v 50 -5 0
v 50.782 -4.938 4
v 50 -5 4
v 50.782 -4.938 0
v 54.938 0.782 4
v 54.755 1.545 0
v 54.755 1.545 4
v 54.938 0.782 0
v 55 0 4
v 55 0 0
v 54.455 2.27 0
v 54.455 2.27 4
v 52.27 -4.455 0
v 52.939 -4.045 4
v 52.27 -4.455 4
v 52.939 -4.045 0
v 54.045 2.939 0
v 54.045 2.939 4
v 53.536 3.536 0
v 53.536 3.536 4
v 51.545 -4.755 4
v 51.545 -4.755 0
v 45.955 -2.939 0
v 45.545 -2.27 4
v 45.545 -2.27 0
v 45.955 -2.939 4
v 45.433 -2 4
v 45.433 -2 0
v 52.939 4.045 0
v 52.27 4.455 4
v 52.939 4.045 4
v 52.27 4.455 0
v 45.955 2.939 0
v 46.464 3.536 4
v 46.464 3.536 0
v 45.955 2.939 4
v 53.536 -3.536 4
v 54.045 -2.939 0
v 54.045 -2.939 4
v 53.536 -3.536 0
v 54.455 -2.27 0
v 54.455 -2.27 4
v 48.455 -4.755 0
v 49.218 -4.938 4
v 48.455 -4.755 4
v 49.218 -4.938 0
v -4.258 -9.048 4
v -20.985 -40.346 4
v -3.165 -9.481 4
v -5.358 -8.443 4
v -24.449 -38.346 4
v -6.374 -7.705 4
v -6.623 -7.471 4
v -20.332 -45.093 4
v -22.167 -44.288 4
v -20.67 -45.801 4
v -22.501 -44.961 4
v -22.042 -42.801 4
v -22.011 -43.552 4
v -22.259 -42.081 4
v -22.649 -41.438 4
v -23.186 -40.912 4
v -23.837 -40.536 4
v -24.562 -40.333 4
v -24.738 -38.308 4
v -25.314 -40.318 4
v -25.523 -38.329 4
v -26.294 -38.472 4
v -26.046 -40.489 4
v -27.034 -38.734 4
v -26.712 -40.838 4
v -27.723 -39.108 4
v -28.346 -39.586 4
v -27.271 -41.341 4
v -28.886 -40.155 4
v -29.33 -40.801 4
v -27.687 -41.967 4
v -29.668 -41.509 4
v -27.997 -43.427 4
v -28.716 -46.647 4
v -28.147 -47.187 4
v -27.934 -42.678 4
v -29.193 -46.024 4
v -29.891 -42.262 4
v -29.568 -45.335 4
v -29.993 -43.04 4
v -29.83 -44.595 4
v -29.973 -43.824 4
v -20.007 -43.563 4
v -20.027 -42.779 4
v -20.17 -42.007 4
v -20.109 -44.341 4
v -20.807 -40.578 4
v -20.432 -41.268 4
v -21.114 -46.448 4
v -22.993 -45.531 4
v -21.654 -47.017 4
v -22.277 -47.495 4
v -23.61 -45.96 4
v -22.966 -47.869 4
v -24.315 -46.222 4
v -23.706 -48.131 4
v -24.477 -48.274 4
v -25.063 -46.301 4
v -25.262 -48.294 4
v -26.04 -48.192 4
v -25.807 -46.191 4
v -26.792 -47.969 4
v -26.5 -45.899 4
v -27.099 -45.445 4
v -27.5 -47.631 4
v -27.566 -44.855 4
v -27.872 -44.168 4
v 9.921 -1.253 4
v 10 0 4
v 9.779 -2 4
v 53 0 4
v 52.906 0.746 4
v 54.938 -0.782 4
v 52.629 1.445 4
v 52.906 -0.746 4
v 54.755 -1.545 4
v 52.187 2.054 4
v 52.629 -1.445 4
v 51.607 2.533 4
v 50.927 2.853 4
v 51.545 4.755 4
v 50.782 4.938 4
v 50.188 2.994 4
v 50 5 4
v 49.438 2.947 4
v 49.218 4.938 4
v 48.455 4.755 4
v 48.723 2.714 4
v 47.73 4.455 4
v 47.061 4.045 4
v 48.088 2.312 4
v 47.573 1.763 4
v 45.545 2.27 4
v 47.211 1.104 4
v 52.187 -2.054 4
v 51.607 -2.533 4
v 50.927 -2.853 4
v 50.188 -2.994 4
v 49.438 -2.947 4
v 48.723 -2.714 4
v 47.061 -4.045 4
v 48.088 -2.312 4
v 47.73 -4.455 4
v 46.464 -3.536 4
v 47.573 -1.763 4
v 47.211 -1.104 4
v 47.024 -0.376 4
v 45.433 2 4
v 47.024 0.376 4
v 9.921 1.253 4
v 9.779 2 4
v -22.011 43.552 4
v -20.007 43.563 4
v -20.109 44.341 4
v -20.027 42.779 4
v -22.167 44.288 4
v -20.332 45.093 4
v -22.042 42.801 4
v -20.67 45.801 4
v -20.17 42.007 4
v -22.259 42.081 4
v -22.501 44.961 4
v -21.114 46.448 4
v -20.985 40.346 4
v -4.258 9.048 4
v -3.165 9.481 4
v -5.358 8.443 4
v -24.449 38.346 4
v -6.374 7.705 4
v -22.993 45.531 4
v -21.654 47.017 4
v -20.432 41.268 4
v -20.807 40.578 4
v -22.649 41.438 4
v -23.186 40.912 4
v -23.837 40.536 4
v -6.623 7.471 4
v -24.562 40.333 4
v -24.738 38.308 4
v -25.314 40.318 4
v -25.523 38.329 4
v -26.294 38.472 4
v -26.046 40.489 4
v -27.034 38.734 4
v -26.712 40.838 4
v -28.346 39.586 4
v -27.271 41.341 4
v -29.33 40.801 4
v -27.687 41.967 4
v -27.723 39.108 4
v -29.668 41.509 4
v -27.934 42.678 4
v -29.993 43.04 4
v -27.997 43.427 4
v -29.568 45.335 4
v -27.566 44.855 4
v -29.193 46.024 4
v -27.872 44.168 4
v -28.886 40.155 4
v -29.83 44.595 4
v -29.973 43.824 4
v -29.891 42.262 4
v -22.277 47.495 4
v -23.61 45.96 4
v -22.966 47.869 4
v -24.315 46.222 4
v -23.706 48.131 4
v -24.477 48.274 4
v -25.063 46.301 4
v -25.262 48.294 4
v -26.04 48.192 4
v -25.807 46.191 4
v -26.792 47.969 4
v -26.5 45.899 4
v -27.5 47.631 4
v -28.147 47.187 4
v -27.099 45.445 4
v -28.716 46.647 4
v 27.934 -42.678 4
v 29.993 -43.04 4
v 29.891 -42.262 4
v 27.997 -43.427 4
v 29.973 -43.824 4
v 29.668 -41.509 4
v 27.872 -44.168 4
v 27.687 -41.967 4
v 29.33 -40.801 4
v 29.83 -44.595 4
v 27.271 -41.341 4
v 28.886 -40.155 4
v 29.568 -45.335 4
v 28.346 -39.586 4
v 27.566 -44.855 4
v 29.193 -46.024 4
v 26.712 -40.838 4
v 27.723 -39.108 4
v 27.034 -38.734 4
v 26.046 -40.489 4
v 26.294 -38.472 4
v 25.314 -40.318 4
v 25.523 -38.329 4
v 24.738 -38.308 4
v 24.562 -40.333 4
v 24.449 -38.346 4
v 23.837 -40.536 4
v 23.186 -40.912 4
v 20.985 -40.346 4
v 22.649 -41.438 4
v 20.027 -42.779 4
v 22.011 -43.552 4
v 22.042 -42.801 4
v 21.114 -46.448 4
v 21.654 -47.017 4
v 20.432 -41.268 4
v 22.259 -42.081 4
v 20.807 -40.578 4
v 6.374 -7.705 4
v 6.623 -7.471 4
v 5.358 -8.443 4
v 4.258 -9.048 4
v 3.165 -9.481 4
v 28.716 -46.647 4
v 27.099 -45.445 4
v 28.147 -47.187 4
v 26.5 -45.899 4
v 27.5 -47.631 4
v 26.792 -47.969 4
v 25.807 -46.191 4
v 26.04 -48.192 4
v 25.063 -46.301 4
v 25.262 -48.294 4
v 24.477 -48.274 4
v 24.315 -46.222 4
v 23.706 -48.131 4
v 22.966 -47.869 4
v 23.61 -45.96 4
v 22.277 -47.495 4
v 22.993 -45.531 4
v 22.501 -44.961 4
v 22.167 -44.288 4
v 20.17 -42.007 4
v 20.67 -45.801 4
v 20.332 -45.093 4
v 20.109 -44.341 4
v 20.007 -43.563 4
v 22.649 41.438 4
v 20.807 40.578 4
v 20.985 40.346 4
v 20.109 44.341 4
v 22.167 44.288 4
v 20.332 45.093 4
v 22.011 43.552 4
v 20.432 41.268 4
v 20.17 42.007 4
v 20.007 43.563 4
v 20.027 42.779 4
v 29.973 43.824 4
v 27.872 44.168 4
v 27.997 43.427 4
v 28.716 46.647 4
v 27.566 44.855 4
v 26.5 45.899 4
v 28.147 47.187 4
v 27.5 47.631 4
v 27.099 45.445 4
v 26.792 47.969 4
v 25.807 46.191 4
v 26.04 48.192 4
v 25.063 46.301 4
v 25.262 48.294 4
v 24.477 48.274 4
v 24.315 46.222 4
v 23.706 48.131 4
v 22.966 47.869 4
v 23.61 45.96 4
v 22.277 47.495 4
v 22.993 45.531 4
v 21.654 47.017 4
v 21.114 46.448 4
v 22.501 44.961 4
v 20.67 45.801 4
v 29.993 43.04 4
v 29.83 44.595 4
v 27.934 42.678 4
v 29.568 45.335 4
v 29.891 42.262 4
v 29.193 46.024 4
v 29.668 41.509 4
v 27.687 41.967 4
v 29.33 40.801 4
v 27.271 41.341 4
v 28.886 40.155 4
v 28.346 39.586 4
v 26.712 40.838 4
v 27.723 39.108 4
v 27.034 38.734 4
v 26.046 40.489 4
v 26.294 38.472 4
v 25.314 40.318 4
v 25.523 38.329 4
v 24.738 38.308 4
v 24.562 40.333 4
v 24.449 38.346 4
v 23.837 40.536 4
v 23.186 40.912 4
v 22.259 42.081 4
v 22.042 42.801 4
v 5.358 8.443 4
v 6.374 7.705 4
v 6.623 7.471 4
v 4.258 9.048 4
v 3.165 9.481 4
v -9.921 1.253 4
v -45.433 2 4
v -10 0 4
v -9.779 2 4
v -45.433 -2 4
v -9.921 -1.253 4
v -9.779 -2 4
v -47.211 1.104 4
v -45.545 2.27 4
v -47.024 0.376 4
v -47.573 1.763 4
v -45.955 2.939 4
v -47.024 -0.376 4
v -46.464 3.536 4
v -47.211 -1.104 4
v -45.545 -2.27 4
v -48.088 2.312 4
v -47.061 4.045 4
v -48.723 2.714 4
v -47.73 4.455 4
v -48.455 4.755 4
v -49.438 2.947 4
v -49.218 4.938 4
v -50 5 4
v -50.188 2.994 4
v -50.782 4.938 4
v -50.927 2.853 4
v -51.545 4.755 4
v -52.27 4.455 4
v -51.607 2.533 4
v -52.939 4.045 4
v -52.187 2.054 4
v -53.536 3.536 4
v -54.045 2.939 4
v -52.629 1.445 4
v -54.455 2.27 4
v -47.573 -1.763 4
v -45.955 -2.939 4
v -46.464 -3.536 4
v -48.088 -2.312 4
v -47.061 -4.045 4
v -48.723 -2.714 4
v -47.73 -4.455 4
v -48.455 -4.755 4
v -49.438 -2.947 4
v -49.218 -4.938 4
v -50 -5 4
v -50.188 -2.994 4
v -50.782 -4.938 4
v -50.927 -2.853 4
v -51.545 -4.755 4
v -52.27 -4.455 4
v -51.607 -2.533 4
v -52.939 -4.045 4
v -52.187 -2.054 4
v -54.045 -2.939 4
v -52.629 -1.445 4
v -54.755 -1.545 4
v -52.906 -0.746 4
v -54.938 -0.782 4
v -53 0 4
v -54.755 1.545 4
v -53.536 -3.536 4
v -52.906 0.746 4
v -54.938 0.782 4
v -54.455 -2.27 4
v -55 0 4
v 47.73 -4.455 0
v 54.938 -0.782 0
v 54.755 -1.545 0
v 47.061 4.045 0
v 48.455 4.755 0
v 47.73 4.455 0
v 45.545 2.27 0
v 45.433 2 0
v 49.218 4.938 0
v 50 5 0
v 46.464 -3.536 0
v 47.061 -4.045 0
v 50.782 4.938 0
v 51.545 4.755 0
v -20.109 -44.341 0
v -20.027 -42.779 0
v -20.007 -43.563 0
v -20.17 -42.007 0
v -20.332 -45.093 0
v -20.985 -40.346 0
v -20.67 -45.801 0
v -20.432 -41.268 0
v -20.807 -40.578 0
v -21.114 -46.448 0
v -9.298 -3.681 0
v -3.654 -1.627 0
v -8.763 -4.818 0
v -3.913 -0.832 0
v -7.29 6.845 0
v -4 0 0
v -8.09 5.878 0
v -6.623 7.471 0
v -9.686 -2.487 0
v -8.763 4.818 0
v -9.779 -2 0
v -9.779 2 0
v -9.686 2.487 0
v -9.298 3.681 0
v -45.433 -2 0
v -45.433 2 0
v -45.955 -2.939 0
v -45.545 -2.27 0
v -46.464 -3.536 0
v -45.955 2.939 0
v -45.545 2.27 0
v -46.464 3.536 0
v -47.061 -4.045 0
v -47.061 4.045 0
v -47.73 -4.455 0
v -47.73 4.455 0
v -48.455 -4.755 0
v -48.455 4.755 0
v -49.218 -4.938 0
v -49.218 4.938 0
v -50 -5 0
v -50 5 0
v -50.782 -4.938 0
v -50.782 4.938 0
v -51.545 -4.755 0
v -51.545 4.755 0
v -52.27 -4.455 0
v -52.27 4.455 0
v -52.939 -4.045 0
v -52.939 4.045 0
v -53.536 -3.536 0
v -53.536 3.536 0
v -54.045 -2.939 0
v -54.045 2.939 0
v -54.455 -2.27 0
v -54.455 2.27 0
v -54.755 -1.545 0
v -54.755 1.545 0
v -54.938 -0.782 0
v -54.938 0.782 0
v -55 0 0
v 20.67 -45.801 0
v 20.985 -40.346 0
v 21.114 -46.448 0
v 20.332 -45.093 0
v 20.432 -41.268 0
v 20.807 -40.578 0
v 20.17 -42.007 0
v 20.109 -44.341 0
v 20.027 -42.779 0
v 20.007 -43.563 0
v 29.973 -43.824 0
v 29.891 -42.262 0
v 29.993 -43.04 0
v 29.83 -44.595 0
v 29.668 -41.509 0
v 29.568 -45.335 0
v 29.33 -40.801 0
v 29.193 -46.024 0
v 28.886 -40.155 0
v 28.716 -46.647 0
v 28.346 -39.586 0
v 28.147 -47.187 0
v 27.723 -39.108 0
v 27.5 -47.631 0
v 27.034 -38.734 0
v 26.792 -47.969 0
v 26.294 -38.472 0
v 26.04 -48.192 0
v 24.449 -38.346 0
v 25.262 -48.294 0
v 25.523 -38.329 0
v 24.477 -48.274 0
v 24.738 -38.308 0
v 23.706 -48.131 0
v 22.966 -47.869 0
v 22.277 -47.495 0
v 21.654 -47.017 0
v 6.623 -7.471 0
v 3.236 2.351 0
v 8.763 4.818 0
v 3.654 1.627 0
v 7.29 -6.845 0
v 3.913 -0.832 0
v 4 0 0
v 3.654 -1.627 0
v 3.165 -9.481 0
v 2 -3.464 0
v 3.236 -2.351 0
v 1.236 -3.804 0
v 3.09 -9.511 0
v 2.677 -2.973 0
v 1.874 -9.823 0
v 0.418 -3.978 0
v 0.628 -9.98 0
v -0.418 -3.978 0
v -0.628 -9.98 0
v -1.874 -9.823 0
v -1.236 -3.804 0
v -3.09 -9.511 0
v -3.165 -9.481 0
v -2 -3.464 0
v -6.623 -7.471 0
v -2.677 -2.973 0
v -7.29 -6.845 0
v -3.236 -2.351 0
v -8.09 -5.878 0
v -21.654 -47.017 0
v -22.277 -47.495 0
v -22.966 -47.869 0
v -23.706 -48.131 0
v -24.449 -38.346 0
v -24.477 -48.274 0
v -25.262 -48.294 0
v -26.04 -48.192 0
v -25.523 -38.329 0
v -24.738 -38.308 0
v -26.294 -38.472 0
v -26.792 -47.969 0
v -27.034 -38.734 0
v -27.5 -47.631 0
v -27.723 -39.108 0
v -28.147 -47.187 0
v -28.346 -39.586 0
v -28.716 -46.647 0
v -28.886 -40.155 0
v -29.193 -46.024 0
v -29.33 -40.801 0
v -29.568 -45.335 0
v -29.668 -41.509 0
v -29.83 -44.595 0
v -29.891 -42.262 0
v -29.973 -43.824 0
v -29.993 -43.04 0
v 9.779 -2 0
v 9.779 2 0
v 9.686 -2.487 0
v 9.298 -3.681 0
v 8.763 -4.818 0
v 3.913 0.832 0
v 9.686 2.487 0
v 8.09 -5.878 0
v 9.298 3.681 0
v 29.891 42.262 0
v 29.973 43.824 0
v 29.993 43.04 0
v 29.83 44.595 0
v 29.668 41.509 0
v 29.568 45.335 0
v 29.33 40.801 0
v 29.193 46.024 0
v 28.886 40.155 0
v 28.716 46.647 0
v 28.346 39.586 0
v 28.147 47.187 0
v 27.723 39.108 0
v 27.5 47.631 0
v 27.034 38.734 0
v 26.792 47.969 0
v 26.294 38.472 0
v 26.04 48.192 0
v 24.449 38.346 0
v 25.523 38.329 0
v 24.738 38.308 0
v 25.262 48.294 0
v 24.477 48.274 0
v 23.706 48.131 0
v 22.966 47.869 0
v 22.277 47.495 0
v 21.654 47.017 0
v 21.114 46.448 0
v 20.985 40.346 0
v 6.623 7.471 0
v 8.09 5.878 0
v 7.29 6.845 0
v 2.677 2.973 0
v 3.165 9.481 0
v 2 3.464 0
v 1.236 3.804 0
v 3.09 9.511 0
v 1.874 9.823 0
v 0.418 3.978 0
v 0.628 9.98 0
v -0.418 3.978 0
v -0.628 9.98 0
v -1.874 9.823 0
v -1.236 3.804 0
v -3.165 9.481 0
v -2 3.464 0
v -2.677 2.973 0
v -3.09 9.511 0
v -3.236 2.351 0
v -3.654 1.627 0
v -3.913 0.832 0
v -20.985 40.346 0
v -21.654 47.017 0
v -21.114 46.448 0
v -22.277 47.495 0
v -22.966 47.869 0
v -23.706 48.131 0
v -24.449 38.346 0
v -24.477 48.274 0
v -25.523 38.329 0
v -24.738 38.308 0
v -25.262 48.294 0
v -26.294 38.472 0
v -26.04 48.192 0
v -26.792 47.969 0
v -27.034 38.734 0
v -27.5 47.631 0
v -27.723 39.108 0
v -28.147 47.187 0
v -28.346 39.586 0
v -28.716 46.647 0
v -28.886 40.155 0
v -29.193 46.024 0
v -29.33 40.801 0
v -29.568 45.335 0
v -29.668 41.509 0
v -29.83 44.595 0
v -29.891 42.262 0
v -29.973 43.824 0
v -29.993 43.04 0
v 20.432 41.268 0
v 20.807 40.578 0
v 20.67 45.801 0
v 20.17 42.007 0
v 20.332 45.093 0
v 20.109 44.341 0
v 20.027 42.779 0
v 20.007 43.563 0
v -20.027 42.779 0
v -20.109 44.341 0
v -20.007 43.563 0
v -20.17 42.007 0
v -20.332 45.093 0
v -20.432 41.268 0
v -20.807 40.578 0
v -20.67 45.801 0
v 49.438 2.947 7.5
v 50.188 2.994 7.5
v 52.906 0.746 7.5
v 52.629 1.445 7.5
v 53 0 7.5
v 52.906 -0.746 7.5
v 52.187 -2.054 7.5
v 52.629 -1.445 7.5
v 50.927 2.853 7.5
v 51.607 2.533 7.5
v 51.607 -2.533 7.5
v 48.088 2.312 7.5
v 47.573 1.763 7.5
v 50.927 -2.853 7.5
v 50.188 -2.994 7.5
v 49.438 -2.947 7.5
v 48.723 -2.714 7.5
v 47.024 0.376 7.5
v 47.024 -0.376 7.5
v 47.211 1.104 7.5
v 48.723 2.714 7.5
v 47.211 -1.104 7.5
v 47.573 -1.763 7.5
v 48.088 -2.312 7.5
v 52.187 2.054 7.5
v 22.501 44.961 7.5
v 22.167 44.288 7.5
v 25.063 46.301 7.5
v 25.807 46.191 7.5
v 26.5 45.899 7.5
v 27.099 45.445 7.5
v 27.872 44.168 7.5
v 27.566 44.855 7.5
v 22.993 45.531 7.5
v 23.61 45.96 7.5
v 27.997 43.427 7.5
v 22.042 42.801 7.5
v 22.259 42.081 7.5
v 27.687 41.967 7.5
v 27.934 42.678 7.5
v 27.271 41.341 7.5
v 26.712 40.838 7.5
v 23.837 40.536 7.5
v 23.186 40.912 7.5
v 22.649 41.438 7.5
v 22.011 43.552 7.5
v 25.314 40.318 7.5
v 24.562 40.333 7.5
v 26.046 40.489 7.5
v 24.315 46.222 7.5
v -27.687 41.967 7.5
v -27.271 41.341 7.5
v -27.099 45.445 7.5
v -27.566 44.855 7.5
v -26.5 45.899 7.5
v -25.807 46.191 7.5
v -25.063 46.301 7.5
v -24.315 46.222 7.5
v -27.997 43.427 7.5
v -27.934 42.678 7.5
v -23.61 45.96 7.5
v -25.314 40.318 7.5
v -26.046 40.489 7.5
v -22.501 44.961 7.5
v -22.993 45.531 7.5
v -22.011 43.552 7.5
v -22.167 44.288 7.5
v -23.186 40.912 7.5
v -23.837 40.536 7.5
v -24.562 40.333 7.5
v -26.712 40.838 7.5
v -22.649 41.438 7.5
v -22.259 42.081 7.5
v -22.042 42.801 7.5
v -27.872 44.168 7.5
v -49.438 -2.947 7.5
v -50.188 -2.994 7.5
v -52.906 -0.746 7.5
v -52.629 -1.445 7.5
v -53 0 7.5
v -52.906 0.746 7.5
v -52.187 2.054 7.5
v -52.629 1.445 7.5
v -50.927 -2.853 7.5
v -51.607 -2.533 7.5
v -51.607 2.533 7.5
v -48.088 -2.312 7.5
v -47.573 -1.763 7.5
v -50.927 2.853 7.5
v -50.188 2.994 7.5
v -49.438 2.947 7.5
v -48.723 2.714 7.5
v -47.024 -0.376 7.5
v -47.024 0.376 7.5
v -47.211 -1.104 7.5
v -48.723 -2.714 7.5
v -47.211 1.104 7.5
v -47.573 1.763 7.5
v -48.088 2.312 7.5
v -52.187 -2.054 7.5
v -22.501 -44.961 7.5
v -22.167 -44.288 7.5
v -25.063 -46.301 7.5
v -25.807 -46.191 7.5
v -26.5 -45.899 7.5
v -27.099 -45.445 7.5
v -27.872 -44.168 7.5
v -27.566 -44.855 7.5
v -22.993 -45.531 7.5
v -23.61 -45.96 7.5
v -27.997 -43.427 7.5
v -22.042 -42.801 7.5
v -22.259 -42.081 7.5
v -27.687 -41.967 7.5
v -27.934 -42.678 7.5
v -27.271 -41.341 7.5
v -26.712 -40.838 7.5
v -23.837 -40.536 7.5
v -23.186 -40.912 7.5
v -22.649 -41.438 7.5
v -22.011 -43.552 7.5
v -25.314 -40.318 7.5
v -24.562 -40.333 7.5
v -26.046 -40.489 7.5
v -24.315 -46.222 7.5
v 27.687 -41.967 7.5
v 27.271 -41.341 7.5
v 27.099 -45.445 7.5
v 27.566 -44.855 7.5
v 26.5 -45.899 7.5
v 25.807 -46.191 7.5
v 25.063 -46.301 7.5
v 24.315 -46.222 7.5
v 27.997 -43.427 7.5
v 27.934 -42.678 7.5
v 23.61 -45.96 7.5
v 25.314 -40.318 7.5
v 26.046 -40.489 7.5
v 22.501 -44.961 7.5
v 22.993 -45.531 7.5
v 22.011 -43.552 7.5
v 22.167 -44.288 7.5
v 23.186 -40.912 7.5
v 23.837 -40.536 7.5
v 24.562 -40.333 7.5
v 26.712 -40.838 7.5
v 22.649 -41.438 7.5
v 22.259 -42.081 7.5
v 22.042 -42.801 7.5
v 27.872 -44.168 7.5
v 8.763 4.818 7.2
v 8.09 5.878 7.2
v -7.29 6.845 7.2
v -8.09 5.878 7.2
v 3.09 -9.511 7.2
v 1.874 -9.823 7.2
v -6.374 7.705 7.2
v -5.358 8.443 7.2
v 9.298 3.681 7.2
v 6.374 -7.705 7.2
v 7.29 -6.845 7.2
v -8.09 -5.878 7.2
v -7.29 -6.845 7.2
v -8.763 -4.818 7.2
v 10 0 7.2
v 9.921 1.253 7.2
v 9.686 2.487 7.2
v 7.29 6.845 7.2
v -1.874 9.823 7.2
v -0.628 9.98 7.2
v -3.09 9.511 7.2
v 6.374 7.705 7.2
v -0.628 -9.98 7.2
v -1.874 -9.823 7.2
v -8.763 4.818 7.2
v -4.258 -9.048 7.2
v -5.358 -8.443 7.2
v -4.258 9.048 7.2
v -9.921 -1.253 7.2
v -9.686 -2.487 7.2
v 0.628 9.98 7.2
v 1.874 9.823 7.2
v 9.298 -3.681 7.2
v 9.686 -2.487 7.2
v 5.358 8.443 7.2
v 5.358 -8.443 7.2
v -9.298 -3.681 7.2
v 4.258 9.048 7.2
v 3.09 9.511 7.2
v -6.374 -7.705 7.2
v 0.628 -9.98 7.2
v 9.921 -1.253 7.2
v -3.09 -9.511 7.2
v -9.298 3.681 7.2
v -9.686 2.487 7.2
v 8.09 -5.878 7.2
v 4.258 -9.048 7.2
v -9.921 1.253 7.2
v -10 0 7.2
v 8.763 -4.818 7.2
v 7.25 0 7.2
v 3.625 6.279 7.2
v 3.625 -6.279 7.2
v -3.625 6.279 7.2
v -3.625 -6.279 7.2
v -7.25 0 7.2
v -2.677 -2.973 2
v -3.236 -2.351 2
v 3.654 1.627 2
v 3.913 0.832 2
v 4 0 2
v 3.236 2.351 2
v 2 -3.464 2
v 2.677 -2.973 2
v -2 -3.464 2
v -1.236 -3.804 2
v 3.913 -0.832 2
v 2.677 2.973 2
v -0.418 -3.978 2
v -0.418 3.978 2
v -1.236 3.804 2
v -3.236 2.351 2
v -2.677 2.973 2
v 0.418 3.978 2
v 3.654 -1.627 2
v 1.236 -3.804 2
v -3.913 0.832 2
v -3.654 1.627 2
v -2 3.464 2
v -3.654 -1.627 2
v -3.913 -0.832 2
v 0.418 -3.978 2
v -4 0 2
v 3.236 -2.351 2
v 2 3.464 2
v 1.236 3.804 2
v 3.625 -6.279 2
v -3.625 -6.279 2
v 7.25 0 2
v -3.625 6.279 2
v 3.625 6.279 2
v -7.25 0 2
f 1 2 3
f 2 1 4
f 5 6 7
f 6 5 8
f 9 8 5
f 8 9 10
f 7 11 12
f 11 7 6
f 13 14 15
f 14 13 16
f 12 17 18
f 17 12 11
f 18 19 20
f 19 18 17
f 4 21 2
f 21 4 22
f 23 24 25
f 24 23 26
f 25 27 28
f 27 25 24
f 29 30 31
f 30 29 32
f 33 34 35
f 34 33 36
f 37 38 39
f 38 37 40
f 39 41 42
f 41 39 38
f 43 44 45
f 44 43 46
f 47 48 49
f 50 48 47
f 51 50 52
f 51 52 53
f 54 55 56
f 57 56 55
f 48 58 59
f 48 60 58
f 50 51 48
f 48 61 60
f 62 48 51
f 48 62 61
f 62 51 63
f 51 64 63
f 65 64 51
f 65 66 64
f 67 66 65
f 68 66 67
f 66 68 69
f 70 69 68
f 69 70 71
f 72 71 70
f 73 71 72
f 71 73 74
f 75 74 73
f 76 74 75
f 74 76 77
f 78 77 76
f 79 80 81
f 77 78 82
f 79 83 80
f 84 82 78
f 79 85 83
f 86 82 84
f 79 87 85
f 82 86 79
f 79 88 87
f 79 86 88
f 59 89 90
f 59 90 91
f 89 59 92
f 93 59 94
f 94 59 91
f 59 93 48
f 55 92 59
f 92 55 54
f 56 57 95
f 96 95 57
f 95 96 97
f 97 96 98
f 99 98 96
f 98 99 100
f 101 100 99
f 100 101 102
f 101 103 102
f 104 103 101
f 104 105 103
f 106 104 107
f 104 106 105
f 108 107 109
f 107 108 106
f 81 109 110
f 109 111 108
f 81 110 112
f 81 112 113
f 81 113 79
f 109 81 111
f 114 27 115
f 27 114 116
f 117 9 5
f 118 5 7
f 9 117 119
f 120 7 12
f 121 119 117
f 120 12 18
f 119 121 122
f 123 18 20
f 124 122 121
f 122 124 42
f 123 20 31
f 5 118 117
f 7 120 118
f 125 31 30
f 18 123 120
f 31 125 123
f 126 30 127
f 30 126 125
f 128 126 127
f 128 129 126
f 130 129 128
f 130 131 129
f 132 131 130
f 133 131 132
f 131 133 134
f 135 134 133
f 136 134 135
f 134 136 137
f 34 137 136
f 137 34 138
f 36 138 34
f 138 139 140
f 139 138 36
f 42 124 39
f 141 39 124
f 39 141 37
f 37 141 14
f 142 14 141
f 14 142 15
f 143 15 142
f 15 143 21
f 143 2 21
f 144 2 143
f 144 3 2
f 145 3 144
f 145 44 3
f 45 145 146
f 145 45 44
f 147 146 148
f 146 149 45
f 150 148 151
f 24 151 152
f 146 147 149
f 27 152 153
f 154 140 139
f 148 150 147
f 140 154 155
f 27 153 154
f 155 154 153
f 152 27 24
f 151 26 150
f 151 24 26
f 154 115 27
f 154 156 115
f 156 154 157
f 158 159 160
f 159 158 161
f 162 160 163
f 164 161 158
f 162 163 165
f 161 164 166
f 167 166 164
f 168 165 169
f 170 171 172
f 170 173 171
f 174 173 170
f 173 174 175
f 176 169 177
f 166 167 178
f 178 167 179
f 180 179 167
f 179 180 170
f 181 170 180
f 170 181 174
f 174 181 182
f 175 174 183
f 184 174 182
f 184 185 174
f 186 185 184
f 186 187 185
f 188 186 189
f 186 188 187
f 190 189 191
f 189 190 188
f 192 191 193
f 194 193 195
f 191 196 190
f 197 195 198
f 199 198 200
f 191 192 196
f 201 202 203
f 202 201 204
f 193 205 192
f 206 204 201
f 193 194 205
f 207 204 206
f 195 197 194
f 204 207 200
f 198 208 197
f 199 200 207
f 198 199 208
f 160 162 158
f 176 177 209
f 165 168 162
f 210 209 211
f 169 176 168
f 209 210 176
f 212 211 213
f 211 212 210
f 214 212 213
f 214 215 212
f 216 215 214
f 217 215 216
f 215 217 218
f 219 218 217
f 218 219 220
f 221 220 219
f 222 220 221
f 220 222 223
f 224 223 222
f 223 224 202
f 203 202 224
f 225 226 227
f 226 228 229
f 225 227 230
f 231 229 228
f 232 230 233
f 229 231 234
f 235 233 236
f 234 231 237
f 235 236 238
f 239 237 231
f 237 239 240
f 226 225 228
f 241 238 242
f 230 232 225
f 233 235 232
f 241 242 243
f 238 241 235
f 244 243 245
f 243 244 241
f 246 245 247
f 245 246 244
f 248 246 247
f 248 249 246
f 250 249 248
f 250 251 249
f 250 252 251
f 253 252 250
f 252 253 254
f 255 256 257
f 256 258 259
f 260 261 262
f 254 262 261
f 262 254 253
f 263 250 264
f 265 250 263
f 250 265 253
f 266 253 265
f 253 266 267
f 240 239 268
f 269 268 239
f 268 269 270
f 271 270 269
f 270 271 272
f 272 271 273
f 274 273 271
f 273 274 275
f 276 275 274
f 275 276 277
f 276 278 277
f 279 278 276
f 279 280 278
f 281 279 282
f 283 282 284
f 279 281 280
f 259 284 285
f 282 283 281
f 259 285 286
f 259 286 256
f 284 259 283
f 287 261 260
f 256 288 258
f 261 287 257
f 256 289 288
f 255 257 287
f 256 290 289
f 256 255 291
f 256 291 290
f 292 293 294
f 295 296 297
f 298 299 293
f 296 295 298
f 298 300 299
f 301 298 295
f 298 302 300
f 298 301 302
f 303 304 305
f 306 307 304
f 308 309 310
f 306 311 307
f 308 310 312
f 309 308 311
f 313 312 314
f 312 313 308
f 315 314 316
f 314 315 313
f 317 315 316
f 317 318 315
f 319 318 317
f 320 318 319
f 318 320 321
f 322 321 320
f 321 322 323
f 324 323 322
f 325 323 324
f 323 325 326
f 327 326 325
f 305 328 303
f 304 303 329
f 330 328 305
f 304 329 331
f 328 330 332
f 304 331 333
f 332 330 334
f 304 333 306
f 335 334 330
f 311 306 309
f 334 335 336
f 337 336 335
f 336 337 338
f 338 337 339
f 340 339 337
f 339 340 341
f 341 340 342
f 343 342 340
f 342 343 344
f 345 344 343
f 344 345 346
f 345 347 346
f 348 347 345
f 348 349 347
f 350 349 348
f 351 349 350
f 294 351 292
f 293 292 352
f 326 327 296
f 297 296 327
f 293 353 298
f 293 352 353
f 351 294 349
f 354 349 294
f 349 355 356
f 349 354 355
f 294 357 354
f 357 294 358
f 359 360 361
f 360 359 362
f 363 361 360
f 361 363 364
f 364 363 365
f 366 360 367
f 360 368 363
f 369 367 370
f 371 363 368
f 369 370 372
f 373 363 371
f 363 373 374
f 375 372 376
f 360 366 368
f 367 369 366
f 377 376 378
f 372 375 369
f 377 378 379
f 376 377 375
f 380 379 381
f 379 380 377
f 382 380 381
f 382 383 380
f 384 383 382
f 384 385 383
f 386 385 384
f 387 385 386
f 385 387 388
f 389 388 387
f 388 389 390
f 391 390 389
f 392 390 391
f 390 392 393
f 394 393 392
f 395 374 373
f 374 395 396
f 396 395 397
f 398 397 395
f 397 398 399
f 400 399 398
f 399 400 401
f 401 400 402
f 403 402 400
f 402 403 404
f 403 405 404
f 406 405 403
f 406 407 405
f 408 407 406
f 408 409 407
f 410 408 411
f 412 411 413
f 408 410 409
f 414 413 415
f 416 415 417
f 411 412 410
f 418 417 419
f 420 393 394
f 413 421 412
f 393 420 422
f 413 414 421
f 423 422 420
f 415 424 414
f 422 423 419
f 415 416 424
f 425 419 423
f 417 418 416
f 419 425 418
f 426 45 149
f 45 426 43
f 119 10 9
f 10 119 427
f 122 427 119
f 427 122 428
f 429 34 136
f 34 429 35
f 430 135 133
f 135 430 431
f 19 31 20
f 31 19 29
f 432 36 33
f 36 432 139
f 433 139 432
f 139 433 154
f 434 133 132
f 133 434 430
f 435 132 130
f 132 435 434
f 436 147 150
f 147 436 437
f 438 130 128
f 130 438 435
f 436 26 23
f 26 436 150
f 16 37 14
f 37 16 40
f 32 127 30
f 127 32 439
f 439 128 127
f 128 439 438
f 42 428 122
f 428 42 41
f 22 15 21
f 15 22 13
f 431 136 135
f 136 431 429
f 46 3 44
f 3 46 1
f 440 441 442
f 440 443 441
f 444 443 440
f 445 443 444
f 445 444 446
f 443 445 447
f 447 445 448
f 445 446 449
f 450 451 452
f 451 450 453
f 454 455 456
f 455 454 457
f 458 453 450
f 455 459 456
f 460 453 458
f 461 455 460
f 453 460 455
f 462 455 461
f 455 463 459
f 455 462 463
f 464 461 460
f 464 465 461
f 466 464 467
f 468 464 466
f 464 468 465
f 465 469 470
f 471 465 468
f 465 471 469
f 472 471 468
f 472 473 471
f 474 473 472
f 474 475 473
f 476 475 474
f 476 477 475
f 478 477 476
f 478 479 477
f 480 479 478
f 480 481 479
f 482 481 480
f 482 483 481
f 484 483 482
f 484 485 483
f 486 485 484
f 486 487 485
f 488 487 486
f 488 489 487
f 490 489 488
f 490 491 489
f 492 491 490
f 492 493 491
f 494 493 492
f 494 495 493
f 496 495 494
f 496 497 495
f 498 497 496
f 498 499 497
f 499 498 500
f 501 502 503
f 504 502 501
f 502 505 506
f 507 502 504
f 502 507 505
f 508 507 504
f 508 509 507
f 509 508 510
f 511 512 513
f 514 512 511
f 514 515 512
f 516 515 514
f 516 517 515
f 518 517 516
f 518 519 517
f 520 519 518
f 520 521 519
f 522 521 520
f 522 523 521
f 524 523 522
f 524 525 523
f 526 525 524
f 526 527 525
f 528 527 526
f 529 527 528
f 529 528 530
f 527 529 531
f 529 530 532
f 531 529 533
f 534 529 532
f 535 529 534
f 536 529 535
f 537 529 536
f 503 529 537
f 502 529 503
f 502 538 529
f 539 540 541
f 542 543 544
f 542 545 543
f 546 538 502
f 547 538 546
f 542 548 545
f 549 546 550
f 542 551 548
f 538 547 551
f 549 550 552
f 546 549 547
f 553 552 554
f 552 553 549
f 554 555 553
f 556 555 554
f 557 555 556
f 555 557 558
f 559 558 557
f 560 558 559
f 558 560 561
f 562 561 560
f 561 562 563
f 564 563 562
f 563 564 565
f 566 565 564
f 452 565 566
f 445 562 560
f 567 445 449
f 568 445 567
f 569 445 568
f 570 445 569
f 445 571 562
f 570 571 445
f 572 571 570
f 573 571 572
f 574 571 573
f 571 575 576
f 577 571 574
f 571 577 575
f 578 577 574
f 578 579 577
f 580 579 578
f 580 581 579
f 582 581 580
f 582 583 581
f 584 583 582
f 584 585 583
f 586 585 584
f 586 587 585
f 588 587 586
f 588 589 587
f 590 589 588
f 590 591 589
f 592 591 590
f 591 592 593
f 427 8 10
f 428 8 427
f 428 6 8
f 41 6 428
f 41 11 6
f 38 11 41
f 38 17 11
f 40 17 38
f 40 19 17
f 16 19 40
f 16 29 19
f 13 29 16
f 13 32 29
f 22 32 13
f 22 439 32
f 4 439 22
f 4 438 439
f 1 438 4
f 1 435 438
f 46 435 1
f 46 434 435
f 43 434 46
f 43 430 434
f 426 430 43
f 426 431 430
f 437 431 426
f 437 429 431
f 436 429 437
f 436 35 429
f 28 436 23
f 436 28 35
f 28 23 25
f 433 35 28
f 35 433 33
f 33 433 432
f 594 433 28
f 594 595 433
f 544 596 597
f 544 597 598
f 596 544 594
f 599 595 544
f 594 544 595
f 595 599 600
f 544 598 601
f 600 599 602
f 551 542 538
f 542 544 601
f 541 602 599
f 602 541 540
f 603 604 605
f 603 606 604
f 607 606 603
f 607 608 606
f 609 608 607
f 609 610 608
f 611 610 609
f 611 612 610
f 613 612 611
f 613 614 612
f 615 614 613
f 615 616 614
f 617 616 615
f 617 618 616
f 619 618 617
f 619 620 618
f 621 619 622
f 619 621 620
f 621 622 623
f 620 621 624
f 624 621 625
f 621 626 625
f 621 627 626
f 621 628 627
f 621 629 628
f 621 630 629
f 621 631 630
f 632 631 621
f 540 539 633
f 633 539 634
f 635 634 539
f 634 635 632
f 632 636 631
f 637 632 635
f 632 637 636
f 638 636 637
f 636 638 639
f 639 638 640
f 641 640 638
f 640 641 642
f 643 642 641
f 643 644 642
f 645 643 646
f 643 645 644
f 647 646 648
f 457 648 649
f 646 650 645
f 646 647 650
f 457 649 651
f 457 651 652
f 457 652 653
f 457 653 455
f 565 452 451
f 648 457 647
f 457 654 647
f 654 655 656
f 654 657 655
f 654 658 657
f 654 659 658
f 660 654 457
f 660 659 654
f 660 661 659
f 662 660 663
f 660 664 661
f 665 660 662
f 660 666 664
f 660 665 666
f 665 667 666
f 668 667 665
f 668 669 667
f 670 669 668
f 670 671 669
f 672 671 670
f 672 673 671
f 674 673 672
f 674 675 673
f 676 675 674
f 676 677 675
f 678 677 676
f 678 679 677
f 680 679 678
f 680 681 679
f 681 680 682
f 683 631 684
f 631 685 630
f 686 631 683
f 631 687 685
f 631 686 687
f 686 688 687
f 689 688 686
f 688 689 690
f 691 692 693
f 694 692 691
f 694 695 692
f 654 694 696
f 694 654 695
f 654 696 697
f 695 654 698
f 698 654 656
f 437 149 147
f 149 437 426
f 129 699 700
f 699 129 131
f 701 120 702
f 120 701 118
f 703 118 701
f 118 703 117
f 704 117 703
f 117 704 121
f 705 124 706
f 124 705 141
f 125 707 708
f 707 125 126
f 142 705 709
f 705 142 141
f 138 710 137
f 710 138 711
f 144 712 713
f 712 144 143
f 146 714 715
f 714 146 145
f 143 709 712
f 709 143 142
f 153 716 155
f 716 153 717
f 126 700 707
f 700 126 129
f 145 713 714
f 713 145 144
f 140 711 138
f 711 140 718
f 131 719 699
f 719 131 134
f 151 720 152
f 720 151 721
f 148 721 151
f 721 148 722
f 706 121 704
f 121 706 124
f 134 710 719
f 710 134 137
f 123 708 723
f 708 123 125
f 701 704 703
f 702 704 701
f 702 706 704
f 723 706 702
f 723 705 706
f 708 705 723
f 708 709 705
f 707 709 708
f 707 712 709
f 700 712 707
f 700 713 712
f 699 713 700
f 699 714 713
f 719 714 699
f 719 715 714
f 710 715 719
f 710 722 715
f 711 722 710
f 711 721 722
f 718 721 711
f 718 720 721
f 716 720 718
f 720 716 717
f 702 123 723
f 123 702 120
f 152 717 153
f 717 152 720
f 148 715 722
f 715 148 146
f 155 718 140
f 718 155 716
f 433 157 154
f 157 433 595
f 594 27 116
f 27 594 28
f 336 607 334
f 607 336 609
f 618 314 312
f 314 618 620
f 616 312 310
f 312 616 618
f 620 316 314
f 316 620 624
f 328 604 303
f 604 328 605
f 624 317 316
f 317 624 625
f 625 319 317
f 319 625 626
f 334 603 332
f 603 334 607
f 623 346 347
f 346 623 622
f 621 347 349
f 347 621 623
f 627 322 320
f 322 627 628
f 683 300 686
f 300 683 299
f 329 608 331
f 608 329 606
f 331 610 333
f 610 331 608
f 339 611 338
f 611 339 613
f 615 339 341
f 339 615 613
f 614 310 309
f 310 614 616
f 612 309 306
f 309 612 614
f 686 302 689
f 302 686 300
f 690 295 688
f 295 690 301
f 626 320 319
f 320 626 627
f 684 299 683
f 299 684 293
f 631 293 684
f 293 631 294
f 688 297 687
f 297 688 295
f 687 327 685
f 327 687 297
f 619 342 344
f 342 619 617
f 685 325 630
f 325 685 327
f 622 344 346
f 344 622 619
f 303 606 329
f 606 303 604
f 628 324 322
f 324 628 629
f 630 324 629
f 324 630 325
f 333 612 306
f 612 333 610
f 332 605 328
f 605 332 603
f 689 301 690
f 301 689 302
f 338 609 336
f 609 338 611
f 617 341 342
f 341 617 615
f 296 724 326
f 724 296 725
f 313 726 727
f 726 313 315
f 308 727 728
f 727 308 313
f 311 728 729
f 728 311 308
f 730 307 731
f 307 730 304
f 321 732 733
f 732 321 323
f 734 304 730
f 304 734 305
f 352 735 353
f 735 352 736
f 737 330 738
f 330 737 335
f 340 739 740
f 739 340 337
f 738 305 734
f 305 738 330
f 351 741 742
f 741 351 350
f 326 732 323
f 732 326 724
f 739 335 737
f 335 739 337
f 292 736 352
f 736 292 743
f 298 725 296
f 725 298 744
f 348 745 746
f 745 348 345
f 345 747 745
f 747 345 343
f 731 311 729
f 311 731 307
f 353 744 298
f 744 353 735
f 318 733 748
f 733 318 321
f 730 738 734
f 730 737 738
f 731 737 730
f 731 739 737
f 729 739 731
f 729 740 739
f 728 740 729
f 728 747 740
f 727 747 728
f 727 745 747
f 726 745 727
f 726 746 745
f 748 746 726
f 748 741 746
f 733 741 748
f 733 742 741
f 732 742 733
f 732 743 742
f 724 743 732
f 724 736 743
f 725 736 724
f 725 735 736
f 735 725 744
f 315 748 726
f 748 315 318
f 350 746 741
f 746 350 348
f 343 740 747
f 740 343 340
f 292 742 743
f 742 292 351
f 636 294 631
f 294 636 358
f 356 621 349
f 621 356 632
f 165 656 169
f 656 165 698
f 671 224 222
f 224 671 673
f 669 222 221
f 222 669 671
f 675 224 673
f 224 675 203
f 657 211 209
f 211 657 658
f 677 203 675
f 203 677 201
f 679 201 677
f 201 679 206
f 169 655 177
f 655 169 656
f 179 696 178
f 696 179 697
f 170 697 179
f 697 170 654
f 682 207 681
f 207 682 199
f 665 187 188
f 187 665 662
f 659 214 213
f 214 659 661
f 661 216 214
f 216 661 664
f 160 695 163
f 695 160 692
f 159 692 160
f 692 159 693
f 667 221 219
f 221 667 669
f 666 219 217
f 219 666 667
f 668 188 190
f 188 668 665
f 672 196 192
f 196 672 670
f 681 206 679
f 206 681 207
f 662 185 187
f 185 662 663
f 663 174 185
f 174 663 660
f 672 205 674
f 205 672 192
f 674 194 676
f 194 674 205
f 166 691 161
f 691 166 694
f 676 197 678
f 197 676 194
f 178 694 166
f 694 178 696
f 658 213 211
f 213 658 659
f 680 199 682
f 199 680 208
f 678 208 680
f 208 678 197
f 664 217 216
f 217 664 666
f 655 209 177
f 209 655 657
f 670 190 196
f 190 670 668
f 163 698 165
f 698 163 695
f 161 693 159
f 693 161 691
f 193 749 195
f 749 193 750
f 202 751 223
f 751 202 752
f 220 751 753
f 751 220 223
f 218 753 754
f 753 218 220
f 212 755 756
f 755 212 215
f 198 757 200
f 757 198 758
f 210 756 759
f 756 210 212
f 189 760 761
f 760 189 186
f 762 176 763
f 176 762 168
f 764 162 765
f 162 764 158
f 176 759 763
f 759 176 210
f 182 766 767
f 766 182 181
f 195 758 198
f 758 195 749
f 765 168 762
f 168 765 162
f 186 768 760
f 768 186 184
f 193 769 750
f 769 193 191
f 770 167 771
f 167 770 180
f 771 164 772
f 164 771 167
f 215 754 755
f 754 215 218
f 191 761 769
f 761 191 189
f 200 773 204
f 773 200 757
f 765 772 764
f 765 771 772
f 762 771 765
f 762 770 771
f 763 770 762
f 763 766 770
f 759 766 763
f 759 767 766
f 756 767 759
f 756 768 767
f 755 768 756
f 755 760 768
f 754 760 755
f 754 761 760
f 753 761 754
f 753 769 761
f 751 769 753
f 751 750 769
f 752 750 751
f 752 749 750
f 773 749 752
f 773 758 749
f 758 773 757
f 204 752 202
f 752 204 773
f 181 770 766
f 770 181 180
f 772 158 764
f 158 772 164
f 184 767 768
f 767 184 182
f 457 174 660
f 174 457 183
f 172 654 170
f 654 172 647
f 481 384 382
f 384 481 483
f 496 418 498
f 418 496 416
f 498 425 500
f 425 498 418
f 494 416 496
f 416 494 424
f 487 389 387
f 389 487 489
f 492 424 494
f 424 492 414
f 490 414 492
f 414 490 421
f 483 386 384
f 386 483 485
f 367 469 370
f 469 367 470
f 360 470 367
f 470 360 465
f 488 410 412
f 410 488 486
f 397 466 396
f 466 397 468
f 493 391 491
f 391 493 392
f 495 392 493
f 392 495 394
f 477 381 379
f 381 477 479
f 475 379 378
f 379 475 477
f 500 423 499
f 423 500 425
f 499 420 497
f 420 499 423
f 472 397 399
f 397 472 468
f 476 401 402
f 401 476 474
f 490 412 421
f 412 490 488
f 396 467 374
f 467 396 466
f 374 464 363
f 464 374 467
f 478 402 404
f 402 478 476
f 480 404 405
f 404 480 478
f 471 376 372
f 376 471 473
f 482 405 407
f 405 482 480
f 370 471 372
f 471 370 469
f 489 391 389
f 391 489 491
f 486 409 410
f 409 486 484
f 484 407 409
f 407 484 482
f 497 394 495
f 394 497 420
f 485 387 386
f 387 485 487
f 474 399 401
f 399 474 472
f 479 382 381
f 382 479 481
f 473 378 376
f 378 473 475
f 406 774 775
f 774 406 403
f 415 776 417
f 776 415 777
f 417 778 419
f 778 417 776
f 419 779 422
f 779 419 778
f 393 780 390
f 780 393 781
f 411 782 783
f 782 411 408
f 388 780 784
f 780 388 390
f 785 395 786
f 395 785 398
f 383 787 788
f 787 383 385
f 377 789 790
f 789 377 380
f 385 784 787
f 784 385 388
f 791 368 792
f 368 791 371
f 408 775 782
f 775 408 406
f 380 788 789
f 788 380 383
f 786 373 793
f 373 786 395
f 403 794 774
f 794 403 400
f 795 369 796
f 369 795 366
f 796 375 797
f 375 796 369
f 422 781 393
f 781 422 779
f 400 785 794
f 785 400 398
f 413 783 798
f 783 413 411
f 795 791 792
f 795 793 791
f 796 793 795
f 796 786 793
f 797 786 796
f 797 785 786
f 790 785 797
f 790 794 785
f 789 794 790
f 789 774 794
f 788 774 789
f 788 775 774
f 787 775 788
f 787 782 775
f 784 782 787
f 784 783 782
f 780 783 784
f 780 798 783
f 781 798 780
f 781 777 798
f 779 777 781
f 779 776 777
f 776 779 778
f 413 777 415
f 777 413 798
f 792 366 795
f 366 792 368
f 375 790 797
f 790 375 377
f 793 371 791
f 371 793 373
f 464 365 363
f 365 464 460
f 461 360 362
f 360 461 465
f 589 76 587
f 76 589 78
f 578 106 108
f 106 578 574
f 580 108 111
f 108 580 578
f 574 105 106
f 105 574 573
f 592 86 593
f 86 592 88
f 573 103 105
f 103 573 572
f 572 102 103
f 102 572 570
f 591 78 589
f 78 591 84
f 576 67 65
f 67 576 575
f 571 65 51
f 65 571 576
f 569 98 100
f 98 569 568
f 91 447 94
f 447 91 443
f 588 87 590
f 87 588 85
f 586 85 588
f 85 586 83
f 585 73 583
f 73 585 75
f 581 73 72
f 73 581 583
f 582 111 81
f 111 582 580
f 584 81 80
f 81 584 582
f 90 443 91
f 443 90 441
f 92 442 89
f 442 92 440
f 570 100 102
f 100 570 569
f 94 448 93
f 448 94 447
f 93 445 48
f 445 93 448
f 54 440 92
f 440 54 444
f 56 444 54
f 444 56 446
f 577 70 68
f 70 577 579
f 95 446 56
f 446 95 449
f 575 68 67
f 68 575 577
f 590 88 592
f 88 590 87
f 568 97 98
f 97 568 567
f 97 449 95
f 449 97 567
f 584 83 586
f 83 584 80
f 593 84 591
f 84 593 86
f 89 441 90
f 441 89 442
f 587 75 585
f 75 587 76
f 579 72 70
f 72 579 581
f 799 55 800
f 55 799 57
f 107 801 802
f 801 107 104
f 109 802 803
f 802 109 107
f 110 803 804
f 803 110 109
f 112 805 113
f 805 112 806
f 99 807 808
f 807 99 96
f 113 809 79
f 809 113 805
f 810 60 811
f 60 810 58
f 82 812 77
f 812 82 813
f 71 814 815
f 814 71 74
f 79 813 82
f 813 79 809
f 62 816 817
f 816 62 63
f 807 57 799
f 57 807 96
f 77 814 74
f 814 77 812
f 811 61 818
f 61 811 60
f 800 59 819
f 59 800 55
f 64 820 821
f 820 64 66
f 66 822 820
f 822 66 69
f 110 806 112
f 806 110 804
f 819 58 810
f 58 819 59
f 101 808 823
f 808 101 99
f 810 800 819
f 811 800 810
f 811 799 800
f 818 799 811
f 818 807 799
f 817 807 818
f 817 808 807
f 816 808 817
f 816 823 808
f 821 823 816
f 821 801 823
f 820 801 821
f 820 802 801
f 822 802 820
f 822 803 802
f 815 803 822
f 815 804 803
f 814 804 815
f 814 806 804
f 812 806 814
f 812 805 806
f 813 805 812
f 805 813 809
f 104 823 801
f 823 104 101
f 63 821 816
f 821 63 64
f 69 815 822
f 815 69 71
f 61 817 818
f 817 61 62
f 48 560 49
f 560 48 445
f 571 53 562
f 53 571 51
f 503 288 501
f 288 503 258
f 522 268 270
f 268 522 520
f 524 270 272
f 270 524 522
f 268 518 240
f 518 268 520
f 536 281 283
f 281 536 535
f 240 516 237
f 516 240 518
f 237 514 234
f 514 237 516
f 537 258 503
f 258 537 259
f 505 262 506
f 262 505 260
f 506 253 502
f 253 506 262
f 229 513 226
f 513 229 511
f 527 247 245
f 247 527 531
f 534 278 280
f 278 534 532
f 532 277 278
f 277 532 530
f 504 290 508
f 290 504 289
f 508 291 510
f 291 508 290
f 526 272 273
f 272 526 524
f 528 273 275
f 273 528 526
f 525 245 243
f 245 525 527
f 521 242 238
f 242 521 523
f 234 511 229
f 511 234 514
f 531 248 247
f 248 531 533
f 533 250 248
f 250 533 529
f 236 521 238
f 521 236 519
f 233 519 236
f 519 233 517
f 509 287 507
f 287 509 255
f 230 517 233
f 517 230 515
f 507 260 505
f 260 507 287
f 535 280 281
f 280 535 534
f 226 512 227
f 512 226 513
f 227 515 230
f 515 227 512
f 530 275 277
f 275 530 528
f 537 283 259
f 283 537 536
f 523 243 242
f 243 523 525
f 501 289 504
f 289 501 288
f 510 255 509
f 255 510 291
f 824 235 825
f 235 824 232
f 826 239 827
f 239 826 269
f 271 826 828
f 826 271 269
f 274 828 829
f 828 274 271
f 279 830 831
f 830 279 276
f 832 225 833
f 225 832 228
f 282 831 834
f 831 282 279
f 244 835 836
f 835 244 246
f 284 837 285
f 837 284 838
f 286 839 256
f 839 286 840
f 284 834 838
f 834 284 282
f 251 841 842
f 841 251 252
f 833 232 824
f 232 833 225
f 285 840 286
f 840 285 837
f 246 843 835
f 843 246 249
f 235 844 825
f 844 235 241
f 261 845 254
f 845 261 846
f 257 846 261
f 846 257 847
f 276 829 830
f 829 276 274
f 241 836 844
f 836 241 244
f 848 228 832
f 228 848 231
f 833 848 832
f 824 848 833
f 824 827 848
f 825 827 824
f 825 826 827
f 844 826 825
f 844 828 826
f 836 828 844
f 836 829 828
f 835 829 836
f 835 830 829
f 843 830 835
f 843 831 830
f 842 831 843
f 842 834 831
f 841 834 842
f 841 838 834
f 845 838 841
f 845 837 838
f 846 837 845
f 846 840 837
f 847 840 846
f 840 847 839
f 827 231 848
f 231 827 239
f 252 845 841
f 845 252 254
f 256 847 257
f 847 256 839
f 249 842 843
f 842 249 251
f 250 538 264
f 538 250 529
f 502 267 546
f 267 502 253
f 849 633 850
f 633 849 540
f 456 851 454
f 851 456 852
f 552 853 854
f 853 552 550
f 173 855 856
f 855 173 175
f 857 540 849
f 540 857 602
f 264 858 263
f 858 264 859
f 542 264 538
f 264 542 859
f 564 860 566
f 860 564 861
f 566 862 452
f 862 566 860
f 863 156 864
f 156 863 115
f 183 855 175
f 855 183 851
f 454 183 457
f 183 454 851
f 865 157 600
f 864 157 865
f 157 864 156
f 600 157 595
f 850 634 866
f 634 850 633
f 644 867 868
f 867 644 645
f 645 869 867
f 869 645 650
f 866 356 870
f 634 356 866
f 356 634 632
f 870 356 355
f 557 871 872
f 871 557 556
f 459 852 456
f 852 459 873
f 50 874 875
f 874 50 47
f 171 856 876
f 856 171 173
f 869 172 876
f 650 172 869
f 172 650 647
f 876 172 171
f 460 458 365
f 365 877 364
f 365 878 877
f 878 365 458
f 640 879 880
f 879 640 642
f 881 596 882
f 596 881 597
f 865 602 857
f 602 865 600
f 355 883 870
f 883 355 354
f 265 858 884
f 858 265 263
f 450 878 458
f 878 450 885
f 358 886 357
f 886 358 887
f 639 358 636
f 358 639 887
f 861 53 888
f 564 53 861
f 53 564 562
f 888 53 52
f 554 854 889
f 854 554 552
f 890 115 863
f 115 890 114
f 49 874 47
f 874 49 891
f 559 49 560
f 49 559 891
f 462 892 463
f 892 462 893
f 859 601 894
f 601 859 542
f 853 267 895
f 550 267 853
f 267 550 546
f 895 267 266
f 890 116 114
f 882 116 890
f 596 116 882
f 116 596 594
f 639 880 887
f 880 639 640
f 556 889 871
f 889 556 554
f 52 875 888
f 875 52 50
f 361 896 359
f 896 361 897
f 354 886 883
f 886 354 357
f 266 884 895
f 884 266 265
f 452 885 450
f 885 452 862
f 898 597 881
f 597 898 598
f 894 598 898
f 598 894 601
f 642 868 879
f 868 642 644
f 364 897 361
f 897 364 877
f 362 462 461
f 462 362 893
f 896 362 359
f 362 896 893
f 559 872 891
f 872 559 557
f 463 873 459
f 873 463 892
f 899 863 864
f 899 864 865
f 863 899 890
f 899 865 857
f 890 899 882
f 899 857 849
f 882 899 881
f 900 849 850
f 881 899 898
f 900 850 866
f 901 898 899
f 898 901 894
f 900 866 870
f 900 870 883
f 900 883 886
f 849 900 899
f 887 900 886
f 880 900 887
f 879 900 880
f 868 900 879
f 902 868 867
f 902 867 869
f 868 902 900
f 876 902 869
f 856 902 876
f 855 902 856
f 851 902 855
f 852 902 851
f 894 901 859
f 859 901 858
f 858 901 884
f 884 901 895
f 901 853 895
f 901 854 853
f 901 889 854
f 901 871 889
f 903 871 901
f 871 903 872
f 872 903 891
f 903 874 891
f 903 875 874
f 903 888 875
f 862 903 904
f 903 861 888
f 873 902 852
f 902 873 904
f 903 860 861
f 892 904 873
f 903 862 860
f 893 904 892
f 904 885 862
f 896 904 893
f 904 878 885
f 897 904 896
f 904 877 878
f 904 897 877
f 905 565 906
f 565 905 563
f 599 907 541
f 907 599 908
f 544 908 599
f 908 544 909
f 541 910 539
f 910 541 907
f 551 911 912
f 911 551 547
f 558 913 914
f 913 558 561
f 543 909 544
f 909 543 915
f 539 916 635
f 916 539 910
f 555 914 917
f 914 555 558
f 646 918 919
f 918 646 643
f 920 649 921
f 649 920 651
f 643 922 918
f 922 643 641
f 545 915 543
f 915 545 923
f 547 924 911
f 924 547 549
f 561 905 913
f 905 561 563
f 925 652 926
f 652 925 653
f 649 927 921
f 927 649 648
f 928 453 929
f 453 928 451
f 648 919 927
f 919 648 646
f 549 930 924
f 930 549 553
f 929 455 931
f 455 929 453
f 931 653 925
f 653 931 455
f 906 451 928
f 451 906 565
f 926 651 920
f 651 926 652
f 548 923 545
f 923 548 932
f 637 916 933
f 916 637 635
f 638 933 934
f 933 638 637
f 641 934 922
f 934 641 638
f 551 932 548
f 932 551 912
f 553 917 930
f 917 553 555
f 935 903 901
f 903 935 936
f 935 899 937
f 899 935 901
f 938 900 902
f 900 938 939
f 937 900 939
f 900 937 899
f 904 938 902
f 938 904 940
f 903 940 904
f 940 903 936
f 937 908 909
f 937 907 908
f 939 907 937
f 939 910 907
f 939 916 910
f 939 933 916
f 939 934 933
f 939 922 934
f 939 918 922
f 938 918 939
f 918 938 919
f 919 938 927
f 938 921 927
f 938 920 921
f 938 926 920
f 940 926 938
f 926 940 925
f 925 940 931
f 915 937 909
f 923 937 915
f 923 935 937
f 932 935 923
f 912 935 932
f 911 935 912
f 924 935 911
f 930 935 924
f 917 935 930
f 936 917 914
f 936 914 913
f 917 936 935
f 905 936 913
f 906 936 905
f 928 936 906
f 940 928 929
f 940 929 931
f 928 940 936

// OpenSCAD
!base();
rod();
translate([0,0,60]) !top();
module base() {
  difference() {
    union() {
    cylinder(d=20,h=7.2,$fn=50);
    for(r=[0:60:360])
    {
      rotate([0, 0, r])
      {
        translate([0,-2]) cube([50,4,4]);
        translate([50,0]) {
          cylinder(d=10,h=4,$fn=40);
          cylinder(d=6,h=7.5,$fn=25);
        }
      }
    }
  }
    translate([0,0,-.01]) cylinder(d=8,h=5.02,$fn=30);
    translate([0,0,2]) cylinder(d=14.5,h=5.23,$fn=6);
  }
      
}
module rod() {
  difference() {
    union() {
      cylinder(d=10,h=60,$fn=30);
      translate([0,0,60]) cylinder(d=7.6,h=3,$fn=30);
      translate([0,0,63]) cylinder(d=5,h=3,$fn=20);
      translate([0,0,50]) cylinder(d1=10,d2=20,h=10,$fn=30);
      translate([0,0,2]) cylinder(d1=30,d2=7.6,h=10,$fn=30);
      cylinder(d=30,h=2,$fn=30);
    }
  }
}
module top() {
  h1=3;
  h2=10;
  h3=3;
difference() {
  union() {
    cylinder(d=60,h=h1,$fn=100);
    for(r=[0:360/6:360])
      rotate([0,0,r]) translate([24,0,h1]) {
        translate([0,0,h2]) cylinder(d=5,h=h3,$fn=20);
        cylinder(d=10,h=h2,$fn=40);
      }
  }
  translate([0,0,-.01]) cylinder(d=8,h=h1+.02,$fn=30);
}
}
